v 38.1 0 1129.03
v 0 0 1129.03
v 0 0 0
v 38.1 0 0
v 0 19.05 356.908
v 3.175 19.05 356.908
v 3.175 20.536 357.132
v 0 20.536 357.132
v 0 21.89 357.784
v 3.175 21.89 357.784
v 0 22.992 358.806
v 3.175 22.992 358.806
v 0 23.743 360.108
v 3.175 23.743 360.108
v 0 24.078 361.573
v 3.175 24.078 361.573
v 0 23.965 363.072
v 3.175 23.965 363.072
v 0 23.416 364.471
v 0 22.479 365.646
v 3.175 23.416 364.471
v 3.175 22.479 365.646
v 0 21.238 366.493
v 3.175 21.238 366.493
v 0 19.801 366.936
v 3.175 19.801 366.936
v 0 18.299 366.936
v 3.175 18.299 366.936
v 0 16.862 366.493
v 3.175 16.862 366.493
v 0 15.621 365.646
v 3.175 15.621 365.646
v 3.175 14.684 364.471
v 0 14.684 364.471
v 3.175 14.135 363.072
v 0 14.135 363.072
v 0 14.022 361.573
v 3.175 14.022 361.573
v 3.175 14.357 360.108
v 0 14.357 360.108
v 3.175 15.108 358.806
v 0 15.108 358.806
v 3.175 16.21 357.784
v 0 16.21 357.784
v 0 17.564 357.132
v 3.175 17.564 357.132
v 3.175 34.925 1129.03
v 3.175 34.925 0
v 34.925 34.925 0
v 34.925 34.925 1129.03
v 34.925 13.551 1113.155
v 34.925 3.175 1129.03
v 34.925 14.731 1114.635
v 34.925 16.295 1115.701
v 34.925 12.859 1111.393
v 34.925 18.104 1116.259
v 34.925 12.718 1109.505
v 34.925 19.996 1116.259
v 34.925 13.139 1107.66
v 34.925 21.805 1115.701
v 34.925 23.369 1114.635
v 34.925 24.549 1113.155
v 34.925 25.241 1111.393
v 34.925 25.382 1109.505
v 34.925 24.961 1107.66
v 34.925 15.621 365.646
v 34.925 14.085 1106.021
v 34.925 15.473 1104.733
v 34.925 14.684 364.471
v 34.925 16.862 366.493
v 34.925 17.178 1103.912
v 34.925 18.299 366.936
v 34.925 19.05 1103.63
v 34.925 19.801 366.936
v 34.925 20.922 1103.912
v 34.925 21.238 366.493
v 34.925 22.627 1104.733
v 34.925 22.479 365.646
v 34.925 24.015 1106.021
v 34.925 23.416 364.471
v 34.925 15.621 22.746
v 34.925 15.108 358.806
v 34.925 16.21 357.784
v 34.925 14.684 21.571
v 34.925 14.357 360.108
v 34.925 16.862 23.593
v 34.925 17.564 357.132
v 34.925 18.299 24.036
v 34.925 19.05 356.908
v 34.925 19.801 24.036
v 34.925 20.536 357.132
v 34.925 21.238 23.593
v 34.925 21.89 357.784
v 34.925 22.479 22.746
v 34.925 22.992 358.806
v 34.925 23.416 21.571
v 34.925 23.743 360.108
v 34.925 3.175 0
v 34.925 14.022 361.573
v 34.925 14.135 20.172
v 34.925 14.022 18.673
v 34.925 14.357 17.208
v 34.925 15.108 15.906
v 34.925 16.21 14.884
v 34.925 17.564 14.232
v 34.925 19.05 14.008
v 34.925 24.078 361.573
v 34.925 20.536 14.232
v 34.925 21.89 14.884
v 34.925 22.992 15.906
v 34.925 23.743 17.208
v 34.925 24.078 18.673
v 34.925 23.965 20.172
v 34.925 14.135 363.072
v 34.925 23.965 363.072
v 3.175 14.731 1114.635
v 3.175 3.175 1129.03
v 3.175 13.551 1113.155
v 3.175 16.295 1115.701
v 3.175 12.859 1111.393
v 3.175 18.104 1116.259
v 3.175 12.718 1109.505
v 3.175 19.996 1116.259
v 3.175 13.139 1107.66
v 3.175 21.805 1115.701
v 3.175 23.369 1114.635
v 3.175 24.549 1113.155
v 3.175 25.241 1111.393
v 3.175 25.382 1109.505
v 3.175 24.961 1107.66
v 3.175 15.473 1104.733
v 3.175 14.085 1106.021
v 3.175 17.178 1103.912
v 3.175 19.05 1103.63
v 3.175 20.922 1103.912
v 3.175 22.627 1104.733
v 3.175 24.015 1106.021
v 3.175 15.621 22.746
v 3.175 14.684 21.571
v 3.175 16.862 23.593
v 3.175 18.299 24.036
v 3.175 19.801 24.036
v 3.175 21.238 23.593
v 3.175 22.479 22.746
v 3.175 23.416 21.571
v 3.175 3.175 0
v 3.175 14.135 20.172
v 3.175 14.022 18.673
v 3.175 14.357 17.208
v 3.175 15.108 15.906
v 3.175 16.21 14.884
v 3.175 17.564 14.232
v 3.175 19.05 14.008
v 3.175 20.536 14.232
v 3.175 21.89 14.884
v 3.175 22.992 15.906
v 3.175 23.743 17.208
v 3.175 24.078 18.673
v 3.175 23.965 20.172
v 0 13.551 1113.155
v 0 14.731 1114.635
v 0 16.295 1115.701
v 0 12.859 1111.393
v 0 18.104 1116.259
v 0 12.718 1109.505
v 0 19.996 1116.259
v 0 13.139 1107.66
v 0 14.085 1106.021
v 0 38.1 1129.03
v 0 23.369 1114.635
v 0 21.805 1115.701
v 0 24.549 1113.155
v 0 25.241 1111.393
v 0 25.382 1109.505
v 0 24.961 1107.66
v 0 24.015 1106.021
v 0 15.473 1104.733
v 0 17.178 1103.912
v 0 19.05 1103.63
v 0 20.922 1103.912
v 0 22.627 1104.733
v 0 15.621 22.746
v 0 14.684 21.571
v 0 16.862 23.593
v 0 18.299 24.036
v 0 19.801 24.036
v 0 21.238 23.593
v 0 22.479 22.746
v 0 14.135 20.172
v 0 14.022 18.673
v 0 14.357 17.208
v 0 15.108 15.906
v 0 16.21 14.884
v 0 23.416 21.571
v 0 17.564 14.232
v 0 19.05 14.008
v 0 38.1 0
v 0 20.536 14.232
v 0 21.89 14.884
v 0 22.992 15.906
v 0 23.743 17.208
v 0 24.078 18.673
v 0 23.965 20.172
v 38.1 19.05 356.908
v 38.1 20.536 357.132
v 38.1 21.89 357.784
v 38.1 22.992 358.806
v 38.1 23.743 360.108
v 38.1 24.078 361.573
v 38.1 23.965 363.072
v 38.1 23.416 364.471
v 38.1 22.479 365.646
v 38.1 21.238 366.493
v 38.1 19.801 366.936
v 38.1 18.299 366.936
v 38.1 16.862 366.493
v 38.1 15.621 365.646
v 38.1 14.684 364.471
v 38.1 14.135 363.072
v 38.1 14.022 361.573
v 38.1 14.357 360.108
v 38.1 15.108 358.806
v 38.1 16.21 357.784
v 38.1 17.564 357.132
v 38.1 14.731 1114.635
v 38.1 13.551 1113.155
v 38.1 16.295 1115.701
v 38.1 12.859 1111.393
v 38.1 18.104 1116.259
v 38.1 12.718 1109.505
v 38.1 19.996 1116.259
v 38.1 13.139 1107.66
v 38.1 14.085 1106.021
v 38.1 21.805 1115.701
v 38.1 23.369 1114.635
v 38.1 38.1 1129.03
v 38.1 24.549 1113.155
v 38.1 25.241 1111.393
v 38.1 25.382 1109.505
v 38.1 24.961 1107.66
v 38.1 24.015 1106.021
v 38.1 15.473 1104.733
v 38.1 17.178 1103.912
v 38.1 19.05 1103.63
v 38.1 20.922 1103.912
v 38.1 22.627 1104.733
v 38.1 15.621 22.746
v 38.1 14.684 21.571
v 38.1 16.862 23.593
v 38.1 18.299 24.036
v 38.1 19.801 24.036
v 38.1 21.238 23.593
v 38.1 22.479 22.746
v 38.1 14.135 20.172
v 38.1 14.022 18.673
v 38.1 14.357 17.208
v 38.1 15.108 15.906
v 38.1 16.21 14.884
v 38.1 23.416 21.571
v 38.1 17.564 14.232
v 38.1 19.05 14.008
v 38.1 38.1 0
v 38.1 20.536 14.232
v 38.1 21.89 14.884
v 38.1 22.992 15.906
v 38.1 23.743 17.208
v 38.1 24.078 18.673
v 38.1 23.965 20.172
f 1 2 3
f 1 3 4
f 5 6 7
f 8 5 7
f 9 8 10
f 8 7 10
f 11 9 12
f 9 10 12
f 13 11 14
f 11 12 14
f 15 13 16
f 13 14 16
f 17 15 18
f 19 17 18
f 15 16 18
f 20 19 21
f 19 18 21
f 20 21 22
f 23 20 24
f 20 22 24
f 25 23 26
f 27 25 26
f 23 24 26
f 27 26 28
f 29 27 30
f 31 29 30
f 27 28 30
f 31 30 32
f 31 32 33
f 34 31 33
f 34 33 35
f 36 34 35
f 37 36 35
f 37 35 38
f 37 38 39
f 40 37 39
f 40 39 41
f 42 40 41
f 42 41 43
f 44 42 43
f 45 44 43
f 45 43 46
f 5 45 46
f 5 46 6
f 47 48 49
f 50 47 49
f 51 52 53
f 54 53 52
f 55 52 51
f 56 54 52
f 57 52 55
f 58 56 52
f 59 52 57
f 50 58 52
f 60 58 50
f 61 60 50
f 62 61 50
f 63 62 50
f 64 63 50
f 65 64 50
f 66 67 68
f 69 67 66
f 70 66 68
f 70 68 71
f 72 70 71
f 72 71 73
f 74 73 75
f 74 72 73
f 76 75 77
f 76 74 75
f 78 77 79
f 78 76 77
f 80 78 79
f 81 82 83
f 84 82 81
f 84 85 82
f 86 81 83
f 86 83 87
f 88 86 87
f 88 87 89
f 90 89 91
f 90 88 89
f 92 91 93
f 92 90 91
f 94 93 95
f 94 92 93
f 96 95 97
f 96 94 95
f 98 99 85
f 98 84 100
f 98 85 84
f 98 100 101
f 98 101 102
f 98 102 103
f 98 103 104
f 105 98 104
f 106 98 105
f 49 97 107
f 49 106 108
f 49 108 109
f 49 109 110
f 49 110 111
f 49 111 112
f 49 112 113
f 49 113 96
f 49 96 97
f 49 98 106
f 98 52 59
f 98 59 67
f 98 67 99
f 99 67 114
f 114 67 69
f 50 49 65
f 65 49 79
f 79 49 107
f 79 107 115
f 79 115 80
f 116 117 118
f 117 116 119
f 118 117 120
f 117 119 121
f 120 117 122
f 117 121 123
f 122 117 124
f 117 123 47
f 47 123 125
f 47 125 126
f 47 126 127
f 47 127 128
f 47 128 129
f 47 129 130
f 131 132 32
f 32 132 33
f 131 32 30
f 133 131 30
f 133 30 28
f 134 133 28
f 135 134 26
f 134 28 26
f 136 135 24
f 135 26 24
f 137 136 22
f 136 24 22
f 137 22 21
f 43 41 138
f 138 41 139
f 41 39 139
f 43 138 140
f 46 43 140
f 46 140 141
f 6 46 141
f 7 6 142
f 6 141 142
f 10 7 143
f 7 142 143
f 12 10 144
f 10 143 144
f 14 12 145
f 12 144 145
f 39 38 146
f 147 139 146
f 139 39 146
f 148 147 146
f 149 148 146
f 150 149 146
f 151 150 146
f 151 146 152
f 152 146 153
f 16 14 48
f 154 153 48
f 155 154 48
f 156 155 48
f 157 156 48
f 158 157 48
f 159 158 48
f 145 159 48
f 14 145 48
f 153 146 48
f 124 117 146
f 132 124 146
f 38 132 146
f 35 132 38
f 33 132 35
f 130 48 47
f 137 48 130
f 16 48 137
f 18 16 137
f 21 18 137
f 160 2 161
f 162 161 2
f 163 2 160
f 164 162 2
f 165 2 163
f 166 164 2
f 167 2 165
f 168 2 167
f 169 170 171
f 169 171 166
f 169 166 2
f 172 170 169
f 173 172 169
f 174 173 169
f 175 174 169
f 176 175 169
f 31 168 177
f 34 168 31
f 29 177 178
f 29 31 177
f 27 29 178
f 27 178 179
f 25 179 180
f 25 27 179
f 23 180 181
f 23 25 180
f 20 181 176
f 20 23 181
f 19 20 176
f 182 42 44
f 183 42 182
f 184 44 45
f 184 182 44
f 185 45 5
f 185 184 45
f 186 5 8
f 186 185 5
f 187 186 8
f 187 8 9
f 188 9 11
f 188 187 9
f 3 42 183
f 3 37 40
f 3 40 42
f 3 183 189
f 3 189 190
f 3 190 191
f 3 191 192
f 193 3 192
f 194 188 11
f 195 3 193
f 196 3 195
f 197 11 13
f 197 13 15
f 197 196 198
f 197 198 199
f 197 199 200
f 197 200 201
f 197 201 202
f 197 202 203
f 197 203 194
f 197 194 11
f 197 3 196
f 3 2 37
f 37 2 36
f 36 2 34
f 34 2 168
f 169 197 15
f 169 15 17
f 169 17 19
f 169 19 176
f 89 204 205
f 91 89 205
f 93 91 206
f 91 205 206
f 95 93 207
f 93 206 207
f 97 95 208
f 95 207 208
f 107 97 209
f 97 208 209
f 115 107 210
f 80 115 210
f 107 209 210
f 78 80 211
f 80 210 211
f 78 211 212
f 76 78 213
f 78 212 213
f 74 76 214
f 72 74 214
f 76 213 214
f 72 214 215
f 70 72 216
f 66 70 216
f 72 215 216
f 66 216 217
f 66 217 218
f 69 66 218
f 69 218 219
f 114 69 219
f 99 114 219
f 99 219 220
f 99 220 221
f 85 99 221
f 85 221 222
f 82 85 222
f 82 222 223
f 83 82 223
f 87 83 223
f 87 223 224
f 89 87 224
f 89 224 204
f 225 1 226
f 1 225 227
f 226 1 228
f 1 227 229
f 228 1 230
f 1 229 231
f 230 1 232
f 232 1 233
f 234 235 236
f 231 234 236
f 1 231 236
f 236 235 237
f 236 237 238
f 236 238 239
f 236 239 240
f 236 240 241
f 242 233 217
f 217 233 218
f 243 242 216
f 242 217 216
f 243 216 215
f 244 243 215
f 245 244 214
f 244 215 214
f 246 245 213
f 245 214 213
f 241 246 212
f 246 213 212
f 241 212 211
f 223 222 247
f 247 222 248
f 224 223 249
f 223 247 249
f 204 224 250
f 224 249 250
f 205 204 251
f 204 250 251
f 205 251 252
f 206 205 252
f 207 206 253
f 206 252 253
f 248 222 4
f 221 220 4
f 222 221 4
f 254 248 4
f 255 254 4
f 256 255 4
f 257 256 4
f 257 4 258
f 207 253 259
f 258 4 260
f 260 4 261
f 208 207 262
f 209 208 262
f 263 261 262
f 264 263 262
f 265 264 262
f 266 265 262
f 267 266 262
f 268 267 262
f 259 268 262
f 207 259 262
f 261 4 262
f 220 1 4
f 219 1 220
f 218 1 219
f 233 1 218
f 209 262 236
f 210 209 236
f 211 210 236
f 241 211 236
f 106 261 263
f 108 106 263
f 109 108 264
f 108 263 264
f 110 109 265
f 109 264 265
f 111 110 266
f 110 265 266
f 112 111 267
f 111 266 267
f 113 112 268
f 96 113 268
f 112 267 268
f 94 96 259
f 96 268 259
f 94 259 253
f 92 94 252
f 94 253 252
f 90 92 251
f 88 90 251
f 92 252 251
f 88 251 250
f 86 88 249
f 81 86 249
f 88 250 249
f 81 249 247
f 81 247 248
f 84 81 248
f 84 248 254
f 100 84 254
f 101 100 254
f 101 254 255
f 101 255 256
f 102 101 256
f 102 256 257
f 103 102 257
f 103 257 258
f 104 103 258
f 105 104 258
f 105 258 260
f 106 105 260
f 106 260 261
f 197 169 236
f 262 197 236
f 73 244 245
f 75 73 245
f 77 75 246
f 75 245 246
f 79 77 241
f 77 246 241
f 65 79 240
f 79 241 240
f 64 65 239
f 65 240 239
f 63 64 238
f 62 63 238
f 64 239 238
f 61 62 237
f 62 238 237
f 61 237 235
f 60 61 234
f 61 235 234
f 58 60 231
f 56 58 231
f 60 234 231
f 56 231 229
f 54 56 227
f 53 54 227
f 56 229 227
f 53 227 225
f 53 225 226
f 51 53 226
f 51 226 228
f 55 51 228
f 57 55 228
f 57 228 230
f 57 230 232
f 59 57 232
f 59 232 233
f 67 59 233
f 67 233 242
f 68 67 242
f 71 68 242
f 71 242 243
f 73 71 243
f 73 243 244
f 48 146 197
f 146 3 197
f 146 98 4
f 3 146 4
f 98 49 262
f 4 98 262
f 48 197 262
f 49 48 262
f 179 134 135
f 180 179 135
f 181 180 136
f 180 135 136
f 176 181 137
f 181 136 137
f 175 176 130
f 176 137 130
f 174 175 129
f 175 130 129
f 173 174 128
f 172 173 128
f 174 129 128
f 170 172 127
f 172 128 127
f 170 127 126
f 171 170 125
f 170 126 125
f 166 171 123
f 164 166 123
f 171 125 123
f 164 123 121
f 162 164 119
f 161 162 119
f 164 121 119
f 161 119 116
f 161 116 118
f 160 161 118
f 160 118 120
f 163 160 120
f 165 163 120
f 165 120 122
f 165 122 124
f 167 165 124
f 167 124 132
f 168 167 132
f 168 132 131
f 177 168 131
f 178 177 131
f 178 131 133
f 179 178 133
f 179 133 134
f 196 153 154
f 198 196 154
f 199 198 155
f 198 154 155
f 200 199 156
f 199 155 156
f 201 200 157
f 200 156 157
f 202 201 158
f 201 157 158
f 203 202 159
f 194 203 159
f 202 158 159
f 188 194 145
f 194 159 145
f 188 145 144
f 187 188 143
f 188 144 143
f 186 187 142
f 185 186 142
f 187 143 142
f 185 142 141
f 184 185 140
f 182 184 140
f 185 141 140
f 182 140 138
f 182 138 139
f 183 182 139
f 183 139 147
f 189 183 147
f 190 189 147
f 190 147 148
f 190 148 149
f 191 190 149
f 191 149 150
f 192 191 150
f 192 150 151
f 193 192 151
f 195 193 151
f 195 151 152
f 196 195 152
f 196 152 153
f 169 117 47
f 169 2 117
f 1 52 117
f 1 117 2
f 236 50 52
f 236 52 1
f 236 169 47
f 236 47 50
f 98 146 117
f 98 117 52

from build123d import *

# Parameters (mm, degrees)
SKETCH2_W                  = 38.1
SKETCH2_H                  = 38.1
SKETCH2_W_2                = 31.75
SKETCH2_H_2                = 31.75
BOSS_EXTRUDE1_DEPTH        = 1129.03
X_0_397_DIAMETER_HOLE1_D   = 10.0838
F_1_2_0_5_DIAMETER_HOLE1_D = 12.7


with BuildPart() as part:
    # Sketch2 → Boss-Extrude1 (new body)
    with BuildSketch(Plane.XY):
        with Locations((19.05, 19.05)):
            Rectangle(SKETCH2_W, SKETCH2_H)
        with Locations((19.05, 19.05)):
            Rectangle(SKETCH2_W_2, SKETCH2_H_2, mode=Mode.SUBTRACT)
    extrude(amount=BOSS_EXTRUDE1_DEPTH)

    # X (0.397) Diameter Hole1 (through all)
    with Locations(Plane.ZY):
        with Locations((19.05, 19.05), (361.95, 19.05)):
            Hole(X_0_397_DIAMETER_HOLE1_D / 2)

    # 1/2 (0.5) Diameter Hole1 (through all)
    with Locations(Plane.ZY):
        with Locations((1109.98, 19.05)):
            Hole(F_1_2_0_5_DIAMETER_HOLE1_D / 2)


solid = part.part
